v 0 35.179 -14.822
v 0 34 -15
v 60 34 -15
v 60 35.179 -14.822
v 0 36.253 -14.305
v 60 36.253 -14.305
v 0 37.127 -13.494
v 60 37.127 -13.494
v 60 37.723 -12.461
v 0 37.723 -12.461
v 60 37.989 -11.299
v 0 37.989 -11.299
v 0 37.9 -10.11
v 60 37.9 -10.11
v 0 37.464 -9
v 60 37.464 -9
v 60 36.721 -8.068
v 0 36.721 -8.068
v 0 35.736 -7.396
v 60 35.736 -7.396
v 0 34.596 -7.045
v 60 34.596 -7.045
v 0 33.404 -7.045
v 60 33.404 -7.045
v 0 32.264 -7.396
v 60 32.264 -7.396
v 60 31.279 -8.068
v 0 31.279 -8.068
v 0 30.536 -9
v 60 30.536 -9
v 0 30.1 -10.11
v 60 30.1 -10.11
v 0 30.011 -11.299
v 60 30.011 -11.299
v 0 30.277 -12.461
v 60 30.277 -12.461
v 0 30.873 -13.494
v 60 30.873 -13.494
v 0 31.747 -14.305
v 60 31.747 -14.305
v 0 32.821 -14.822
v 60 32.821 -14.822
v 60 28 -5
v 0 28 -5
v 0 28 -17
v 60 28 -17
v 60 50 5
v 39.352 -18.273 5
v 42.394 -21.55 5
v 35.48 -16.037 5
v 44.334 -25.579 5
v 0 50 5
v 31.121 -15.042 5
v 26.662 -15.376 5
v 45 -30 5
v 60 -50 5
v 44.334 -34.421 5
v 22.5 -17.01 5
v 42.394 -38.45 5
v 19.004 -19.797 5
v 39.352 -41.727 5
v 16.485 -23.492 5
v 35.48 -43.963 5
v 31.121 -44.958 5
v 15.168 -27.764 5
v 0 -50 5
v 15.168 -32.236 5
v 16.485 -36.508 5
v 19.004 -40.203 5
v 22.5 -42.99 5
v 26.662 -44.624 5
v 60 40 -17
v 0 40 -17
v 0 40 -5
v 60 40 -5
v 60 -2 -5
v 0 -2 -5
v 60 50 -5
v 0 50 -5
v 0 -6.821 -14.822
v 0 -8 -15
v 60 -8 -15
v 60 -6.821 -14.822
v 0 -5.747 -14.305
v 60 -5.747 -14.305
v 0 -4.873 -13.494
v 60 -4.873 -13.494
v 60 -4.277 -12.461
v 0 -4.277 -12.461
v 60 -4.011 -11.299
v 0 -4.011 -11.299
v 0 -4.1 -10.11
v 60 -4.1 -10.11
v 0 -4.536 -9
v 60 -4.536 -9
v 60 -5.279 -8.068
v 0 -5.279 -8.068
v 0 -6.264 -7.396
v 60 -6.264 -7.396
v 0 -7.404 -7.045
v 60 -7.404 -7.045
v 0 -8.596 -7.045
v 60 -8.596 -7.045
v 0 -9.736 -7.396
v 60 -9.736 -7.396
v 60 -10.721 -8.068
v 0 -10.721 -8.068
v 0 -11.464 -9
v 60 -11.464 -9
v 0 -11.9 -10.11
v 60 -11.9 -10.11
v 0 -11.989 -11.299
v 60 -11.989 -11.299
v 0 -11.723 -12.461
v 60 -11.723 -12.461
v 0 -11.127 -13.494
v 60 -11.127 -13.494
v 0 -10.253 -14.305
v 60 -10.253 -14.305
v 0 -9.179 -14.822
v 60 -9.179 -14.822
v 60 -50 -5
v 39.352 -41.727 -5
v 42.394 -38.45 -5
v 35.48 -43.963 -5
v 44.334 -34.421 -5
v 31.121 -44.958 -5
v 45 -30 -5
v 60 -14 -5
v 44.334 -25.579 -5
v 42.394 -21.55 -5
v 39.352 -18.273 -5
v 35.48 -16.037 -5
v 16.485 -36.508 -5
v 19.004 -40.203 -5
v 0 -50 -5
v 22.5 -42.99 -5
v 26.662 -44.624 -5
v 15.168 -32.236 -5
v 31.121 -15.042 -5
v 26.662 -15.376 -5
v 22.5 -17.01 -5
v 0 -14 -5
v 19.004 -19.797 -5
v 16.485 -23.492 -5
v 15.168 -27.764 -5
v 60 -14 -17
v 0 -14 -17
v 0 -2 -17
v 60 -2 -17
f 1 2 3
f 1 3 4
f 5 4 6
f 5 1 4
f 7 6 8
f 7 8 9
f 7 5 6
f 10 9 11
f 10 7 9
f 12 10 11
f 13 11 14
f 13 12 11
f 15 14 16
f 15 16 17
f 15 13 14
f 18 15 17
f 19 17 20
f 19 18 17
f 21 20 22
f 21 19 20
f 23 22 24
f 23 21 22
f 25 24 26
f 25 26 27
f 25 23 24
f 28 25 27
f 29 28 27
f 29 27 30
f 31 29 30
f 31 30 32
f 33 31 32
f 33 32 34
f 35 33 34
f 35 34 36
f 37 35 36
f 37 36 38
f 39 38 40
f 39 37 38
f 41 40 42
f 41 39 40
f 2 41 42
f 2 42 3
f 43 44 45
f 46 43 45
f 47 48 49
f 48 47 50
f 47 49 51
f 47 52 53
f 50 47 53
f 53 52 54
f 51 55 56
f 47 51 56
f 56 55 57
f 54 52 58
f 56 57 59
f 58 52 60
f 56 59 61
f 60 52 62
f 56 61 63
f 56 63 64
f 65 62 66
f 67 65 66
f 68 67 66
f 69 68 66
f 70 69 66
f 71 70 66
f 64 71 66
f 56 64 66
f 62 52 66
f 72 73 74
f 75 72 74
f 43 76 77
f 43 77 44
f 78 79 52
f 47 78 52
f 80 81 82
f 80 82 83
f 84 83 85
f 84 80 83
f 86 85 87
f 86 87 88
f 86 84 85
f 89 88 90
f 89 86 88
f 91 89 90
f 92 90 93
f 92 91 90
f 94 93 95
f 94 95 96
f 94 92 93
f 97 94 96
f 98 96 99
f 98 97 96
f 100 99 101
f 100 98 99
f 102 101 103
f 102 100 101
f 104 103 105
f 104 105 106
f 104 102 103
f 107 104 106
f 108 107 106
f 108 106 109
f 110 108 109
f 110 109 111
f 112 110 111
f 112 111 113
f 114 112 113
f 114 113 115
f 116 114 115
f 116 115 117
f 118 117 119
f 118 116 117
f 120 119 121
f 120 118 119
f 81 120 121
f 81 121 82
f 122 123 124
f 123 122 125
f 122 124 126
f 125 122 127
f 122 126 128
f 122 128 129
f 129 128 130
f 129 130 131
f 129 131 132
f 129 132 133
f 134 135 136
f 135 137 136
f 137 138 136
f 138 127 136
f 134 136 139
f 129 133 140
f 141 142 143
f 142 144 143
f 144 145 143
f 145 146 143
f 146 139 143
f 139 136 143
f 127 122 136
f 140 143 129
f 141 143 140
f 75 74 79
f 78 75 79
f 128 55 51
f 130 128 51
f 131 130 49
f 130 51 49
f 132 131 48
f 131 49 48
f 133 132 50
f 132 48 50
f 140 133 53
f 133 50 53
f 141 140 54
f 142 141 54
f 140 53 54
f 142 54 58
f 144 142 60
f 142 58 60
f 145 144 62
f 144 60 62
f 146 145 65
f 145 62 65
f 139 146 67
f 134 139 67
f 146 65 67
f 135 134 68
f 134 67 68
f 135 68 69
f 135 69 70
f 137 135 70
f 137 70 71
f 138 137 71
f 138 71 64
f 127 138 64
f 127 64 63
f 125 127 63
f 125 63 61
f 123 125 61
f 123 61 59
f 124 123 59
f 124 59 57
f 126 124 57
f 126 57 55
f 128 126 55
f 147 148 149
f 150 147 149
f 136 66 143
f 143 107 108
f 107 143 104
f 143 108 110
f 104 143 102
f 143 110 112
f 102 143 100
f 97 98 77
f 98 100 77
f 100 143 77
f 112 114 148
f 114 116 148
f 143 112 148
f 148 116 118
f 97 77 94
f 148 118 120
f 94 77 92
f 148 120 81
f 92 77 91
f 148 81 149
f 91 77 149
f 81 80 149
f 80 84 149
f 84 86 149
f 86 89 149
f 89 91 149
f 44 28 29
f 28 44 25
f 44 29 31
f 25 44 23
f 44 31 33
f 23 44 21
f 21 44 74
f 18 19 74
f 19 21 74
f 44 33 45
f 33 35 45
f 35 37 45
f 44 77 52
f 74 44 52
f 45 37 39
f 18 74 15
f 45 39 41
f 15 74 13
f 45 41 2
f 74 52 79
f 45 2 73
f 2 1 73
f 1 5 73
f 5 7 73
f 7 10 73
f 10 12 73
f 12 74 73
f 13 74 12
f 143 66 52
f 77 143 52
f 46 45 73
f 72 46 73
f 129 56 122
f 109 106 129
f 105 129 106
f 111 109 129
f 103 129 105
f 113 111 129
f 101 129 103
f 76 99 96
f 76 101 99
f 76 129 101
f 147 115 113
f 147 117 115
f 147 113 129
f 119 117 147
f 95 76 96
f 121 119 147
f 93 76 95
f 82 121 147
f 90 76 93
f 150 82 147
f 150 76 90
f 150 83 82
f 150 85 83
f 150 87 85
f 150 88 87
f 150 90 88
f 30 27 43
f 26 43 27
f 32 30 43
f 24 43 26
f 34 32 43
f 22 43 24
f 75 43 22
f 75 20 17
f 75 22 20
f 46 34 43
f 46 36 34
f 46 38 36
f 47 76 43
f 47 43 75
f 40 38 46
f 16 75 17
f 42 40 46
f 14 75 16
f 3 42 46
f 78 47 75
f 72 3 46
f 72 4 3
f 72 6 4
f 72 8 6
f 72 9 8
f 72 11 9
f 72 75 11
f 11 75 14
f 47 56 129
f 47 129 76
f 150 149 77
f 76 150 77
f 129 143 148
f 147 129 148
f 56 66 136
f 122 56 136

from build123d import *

# Parameters (mm, degrees)
SKETCH_1_R          = 4
EXTRUDE_1_DEPTH     = 60
SKETCH_2_R          = 15
CUT_EXTRUDE_1_DEPTH = 60


with BuildPart() as part:
    # 草图1 → 凸台-拉伸1 (new body)
    with BuildSketch(Plane(origin=(0, 0, 0), x_dir=(0, 0, -1), z_dir=(1, 0, 0))):
        Polygon((5, -2), (5, 28), (17, 28), (17, 40), (5, 40), (5, 50), (-5, 50), (-5, -50), (5, -50), (5, -14), (17, -14), (17, -2), align=None)
        with Locations((11, 34)):
            Circle(SKETCH_1_R, mode=Mode.SUBTRACT)
        with Locations((11, -8)):
            Circle(SKETCH_1_R, mode=Mode.SUBTRACT)
    extrude(amount=EXTRUDE_1_DEPTH)

    # 草图2 → 切除-拉伸1 (cut)
    with BuildSketch(Plane.XY.offset(5)):
        with Locations((30, -30)):
            Circle(SKETCH_2_R)
    extrude(amount=-CUT_EXTRUDE_1_DEPTH, mode=Mode.SUBTRACT)


solid = part.part
